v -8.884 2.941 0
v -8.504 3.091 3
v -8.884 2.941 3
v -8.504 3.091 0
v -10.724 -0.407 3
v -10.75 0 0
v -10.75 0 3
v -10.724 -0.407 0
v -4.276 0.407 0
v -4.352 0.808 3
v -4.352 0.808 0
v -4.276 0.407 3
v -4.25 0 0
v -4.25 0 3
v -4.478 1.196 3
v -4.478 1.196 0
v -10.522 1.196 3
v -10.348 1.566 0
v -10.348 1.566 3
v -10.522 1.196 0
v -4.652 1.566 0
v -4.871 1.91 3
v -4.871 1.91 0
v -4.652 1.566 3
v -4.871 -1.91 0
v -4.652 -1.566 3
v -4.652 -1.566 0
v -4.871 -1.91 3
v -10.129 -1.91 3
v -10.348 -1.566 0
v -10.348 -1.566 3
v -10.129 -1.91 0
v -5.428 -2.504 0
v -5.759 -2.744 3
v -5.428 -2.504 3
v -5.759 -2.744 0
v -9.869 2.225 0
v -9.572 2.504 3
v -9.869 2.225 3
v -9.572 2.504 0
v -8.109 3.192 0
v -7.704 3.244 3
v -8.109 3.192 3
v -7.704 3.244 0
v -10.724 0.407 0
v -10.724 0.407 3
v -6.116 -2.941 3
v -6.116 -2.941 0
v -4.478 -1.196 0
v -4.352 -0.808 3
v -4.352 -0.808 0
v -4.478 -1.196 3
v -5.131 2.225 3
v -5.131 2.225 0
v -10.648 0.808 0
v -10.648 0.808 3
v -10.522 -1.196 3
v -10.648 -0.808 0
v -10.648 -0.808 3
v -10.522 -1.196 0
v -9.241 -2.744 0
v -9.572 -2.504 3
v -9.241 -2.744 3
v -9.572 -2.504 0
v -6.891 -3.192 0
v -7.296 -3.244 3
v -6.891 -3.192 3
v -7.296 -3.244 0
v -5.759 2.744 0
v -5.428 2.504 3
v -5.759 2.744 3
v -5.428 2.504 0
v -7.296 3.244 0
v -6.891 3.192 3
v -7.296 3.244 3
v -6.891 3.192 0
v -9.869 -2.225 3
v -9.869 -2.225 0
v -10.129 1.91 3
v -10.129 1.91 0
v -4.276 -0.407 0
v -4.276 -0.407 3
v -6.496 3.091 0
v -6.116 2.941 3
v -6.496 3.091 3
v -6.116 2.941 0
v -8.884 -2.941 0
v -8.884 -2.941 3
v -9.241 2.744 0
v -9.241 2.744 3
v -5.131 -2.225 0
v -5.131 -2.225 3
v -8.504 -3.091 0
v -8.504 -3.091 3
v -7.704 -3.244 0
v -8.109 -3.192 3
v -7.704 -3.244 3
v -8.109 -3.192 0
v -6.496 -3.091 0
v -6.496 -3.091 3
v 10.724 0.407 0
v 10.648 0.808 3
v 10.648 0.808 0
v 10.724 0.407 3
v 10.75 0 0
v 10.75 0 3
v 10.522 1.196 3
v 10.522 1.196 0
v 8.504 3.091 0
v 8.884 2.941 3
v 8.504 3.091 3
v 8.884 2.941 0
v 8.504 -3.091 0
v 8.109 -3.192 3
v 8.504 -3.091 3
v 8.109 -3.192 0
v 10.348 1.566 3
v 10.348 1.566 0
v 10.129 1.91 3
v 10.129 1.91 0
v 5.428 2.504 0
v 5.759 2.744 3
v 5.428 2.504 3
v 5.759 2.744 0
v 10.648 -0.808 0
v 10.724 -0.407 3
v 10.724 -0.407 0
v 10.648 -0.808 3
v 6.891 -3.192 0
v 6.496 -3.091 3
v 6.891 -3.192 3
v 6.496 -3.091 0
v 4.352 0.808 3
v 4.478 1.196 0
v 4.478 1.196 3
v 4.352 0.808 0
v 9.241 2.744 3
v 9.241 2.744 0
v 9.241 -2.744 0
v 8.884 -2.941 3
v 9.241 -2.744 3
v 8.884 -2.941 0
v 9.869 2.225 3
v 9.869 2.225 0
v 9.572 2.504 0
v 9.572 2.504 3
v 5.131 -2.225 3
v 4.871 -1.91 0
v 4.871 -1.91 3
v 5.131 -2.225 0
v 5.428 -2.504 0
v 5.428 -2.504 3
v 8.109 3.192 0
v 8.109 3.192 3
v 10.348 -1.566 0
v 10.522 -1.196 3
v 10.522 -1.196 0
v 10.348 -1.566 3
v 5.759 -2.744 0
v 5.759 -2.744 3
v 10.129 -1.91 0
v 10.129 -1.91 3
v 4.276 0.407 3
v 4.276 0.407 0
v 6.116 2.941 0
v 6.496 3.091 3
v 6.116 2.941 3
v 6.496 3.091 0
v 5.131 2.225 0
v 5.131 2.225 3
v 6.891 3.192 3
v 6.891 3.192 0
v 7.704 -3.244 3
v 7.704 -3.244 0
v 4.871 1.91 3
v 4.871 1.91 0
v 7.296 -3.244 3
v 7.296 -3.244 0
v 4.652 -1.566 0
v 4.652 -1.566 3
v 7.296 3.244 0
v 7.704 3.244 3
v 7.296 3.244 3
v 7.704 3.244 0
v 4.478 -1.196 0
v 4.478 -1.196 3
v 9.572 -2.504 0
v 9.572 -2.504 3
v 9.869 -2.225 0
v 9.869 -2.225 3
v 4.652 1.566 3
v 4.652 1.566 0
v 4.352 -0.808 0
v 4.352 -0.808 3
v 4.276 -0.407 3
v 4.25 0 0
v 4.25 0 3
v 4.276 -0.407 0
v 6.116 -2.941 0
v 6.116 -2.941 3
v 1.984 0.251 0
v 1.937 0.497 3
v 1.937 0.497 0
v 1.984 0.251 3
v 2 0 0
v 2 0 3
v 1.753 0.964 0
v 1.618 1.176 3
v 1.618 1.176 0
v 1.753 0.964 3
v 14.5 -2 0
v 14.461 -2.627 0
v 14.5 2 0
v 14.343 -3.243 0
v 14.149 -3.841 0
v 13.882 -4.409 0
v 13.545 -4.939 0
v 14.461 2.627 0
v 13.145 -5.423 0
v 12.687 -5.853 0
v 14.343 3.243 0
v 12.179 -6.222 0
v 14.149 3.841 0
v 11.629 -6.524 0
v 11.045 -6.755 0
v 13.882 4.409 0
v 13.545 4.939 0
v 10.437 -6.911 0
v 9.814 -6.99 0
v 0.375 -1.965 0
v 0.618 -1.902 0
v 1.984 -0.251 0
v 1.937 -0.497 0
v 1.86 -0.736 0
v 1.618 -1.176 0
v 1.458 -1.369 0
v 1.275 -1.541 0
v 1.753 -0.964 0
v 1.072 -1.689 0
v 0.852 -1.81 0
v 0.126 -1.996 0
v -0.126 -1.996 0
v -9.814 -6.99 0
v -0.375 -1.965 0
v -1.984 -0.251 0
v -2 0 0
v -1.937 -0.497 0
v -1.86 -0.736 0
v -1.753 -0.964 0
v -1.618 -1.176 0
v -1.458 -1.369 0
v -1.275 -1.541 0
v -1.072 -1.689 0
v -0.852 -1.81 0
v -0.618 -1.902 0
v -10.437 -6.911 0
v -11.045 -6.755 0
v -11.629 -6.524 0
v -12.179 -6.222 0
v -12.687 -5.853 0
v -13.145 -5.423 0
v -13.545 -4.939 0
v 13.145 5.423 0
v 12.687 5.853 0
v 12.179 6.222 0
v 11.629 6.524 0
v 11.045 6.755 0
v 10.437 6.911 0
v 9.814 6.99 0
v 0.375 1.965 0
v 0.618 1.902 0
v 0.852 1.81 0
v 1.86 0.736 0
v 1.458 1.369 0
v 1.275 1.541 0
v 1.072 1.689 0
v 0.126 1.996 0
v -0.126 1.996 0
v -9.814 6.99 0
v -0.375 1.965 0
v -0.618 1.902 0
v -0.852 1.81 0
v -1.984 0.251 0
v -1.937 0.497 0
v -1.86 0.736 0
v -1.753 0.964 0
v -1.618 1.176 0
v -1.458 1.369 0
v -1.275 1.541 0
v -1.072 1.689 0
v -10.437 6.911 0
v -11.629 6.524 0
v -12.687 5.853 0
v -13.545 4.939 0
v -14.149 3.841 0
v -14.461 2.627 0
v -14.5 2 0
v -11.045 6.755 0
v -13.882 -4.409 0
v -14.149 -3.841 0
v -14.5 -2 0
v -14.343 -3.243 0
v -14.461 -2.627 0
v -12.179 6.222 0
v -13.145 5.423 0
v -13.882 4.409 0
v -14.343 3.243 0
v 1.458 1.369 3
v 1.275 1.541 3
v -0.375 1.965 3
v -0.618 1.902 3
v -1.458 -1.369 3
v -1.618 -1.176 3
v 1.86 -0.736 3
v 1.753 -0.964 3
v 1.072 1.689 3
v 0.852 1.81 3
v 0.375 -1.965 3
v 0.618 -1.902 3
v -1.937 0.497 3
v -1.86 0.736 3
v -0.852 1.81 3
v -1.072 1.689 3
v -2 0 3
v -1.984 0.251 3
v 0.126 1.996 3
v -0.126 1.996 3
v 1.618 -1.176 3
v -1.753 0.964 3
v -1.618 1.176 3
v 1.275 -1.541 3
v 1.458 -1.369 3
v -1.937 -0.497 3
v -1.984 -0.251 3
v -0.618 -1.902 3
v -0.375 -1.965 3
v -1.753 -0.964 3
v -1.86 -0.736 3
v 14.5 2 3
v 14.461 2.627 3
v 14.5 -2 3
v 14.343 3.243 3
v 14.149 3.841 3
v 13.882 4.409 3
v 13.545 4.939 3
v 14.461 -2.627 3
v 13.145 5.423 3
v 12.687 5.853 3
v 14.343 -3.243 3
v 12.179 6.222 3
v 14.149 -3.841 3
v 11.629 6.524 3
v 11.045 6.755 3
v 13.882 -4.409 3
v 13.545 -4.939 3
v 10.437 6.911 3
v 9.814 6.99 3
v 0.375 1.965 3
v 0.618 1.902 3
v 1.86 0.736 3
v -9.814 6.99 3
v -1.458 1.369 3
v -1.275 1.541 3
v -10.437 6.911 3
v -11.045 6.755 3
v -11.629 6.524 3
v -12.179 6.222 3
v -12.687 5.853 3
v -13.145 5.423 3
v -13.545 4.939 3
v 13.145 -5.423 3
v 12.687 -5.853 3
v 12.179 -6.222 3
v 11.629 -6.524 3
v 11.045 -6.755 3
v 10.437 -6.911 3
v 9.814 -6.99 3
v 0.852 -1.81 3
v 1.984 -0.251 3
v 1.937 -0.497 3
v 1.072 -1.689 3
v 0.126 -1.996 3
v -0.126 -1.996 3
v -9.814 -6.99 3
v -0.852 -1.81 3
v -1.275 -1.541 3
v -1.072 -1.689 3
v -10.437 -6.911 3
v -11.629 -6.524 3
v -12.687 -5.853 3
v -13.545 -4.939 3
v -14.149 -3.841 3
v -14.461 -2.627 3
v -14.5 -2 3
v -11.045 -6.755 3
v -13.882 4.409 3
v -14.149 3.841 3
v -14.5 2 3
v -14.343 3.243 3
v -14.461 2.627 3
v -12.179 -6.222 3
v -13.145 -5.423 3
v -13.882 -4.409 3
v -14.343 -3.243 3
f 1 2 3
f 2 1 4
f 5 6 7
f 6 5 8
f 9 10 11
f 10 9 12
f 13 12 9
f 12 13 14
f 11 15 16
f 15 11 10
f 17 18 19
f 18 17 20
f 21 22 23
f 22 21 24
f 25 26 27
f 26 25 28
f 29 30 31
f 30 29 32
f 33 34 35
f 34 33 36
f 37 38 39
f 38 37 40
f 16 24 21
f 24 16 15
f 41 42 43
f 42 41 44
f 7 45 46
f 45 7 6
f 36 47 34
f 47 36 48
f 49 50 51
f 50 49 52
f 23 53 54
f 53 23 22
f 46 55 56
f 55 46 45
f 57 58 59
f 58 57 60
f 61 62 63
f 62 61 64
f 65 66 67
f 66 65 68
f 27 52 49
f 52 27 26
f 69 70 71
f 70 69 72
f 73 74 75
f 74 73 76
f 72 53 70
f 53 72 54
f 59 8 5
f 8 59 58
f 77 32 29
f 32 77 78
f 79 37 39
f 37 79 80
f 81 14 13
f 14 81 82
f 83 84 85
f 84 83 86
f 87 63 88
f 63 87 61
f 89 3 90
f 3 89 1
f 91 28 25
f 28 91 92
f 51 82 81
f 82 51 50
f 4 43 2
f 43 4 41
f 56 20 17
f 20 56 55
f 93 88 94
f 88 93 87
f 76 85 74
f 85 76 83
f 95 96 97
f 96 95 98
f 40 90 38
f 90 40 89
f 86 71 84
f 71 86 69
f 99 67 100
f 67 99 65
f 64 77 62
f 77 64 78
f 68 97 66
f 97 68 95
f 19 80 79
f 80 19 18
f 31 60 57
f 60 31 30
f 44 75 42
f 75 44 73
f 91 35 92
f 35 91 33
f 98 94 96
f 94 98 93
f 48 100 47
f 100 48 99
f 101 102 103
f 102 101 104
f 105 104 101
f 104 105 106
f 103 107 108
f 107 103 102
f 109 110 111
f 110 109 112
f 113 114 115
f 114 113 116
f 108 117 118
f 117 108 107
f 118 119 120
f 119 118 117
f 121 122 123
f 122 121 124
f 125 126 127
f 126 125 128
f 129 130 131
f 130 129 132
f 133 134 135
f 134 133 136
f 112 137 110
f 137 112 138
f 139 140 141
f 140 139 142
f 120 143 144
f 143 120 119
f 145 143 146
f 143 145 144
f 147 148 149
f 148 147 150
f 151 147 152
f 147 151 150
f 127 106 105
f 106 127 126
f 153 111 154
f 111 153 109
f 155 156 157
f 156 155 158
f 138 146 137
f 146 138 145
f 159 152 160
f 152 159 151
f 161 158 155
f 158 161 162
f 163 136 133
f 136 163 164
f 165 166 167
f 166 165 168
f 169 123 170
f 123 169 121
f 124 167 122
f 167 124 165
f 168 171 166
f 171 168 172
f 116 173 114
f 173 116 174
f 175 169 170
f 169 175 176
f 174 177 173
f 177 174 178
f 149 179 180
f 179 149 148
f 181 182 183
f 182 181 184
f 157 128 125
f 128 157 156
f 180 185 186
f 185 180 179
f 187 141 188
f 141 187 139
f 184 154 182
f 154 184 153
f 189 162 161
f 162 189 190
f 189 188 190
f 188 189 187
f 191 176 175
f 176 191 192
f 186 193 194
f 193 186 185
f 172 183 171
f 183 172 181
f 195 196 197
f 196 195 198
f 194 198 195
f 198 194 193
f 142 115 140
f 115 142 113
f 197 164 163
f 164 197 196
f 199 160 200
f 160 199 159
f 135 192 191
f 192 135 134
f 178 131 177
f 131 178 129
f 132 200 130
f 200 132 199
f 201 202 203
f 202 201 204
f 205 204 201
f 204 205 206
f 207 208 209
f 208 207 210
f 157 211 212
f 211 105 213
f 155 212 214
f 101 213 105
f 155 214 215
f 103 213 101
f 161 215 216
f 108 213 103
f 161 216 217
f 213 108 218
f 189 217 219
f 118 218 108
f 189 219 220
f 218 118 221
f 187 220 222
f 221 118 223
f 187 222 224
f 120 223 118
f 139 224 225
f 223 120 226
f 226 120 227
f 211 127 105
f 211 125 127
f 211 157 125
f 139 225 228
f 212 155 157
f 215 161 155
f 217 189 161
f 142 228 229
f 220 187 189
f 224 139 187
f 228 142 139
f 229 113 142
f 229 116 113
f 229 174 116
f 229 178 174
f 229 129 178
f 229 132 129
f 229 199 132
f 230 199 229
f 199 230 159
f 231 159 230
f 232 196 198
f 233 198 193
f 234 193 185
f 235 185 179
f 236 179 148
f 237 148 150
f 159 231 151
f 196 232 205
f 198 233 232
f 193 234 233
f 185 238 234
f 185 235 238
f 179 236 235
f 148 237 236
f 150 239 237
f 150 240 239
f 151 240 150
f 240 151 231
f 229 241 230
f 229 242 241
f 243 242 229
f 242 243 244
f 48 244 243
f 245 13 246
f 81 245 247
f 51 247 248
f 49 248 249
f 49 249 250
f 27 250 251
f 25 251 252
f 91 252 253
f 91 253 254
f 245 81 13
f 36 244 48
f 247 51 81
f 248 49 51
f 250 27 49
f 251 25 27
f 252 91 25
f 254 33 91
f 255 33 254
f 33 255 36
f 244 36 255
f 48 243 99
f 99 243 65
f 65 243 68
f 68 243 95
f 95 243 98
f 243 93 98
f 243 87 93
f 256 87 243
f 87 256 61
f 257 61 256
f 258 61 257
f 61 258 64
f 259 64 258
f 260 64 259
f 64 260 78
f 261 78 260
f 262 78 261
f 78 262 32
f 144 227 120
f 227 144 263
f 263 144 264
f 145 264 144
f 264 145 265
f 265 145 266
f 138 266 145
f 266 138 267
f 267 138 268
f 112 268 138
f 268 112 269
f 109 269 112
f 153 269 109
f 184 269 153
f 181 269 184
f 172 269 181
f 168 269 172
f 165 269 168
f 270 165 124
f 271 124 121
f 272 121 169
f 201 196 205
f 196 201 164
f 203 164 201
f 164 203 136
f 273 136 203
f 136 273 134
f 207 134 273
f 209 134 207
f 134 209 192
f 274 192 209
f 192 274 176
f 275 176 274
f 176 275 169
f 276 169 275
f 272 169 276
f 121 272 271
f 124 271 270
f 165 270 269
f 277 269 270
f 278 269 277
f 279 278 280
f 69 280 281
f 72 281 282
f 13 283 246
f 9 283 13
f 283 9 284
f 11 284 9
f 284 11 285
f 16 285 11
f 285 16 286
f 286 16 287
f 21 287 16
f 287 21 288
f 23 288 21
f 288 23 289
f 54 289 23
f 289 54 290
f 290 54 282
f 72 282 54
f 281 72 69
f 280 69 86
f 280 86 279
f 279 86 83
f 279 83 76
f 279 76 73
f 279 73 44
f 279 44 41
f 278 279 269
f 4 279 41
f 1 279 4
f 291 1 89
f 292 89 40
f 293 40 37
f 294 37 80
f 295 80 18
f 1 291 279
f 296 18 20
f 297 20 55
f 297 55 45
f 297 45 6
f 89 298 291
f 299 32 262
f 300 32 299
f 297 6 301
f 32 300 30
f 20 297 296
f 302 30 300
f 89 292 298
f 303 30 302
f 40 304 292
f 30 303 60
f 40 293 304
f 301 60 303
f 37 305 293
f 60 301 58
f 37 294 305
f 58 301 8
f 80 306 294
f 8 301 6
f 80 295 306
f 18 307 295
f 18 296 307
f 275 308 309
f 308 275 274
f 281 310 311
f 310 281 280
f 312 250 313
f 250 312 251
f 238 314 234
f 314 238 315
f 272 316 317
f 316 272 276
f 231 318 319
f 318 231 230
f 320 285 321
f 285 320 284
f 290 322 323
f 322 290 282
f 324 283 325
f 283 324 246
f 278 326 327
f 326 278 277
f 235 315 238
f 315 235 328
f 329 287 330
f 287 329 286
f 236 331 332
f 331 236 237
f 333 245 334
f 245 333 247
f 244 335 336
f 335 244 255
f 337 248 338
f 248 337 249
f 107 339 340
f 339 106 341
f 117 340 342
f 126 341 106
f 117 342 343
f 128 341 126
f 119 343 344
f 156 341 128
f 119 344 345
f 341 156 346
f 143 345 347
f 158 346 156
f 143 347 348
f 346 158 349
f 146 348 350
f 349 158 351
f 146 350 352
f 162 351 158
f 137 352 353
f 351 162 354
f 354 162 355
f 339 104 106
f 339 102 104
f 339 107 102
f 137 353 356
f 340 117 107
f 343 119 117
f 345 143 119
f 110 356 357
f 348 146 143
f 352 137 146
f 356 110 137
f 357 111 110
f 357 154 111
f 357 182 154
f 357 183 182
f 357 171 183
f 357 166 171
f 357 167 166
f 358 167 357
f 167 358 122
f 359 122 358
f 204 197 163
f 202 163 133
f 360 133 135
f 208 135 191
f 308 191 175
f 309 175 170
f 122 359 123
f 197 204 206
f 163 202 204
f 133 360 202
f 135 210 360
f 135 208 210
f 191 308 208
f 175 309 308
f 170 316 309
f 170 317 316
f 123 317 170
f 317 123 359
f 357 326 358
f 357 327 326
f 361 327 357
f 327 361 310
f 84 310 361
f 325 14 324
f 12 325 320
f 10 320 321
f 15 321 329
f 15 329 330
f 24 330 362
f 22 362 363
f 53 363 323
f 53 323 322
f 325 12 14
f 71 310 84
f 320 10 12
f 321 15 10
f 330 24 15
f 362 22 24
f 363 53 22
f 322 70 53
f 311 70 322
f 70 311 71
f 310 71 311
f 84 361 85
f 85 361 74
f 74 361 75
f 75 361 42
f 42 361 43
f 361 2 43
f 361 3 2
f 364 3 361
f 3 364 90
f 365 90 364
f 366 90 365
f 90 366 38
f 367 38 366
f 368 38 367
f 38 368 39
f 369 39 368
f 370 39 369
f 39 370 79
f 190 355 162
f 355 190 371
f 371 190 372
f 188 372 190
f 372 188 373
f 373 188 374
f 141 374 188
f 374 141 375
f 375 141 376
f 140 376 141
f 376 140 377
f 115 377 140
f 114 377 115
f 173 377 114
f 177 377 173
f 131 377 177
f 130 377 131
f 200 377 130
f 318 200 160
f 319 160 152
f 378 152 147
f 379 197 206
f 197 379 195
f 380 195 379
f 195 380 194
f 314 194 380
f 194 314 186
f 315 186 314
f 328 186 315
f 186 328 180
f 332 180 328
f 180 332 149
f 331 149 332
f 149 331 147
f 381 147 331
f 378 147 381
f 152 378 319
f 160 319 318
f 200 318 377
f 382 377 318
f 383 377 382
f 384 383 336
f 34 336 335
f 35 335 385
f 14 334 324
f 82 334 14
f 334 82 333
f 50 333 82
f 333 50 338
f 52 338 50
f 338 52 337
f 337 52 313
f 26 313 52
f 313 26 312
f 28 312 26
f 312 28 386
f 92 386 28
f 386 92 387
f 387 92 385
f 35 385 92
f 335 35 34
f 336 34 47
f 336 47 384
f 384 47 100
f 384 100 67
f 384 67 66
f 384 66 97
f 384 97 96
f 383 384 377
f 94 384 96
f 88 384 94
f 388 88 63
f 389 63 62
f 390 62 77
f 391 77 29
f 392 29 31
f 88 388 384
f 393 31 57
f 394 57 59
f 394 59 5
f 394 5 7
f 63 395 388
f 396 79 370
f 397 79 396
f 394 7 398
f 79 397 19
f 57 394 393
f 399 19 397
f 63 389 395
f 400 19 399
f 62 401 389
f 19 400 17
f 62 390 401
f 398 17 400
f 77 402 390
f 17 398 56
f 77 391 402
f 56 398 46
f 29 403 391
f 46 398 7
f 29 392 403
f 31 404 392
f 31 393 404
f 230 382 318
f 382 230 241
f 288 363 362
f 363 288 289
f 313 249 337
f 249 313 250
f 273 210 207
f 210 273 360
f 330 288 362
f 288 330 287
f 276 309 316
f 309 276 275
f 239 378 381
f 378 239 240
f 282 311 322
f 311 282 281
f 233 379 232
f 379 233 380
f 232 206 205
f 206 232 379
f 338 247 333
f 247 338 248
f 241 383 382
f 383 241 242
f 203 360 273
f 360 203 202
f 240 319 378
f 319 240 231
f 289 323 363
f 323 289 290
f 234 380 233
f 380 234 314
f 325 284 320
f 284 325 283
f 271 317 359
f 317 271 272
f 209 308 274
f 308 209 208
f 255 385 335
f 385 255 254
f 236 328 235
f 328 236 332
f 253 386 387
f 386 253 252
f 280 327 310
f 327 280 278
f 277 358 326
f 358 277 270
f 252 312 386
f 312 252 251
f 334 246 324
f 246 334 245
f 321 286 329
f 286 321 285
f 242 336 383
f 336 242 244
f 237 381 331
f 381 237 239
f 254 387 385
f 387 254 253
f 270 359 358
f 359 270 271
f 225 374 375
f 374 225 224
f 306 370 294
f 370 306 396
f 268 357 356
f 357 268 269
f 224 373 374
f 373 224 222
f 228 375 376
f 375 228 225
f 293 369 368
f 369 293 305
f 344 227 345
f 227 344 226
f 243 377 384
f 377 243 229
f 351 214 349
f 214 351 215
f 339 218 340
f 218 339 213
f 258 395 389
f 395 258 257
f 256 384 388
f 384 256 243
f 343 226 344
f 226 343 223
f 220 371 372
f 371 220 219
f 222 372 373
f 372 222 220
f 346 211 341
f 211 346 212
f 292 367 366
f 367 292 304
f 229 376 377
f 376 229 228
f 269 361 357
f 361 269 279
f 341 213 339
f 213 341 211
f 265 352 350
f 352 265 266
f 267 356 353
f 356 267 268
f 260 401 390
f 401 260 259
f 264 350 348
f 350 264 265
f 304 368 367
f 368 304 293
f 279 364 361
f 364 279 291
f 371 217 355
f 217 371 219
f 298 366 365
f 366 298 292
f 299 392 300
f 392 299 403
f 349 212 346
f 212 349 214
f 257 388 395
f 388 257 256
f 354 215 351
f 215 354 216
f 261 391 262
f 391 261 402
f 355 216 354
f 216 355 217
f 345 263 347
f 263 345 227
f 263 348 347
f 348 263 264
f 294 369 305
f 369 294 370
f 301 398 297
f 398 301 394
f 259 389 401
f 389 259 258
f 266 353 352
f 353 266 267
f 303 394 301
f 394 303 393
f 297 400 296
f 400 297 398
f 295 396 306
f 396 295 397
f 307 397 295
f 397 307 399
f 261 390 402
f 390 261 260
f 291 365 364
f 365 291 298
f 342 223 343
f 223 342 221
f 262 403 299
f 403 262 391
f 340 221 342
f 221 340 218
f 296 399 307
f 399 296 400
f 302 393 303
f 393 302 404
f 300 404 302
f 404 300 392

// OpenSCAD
$fn = 50;


difference() {
	union() {
		hull() {
			translate(v = [-9.5000000000, 2.0000000000, 0]) {
				cylinder(h = 3, r = 5);
			}
			translate(v = [9.5000000000, 2.0000000000, 0]) {
				cylinder(h = 3, r = 5);
			}
			translate(v = [-9.5000000000, -2.0000000000, 0]) {
				cylinder(h = 3, r = 5);
			}
			translate(v = [9.5000000000, -2.0000000000, 0]) {
				cylinder(h = 3, r = 5);
			}
		}
	}
	union() {
		#translate(v = [-7.5000000000, 0.0000000000, 0]) {
			cylinder(h = 3, r = 3.2500000000);
		}
		#translate(v = [7.5000000000, 0.0000000000, 0]) {
			cylinder(h = 3, r = 3.2500000000);
		}
		#translate(v = [-7.5000000000, 0.0000000000, -100.0000000000]) {
			cylinder(h = 200, r = 3.2500000000);
		}
		#translate(v = [-7.5000000000, 0.0000000000, -100.0000000000]) {
			cylinder(h = 200, r = 3.2500000000);
		}
		#translate(v = [7.5000000000, 0.0000000000, -100.0000000000]) {
			cylinder(h = 200, r = 3.2500000000);
		}
		#translate(v = [7.5000000000, 0.0000000000, -100.0000000000]) {
			cylinder(h = 200, r = 3.2500000000);
		}
		#translate(v = [-7.5000000000, 0.0000000000, 0]) {
			cylinder(h = 3, r = 1.8000000000);
		}
		#translate(v = [7.5000000000, 0.0000000000, 0]) {
			cylinder(h = 3, r = 1.8000000000);
		}
		#translate(v = [-7.5000000000, 0.0000000000, 0]) {
			cylinder(h = 3, r = 1.8000000000);
		}
		#translate(v = [7.5000000000, 0.0000000000, 0]) {
			cylinder(h = 3, r = 1.8000000000);
		}
		#translate(v = [-7.5000000000, 0.0000000000, 0]) {
			cylinder(h = 3, r = 1.8000000000);
		}
		#translate(v = [7.5000000000, 0.0000000000, 0]) {
			cylinder(h = 3, r = 1.8000000000);
		}
		#cylinder(h = 3, r = 2.0000000000);
	}
}
